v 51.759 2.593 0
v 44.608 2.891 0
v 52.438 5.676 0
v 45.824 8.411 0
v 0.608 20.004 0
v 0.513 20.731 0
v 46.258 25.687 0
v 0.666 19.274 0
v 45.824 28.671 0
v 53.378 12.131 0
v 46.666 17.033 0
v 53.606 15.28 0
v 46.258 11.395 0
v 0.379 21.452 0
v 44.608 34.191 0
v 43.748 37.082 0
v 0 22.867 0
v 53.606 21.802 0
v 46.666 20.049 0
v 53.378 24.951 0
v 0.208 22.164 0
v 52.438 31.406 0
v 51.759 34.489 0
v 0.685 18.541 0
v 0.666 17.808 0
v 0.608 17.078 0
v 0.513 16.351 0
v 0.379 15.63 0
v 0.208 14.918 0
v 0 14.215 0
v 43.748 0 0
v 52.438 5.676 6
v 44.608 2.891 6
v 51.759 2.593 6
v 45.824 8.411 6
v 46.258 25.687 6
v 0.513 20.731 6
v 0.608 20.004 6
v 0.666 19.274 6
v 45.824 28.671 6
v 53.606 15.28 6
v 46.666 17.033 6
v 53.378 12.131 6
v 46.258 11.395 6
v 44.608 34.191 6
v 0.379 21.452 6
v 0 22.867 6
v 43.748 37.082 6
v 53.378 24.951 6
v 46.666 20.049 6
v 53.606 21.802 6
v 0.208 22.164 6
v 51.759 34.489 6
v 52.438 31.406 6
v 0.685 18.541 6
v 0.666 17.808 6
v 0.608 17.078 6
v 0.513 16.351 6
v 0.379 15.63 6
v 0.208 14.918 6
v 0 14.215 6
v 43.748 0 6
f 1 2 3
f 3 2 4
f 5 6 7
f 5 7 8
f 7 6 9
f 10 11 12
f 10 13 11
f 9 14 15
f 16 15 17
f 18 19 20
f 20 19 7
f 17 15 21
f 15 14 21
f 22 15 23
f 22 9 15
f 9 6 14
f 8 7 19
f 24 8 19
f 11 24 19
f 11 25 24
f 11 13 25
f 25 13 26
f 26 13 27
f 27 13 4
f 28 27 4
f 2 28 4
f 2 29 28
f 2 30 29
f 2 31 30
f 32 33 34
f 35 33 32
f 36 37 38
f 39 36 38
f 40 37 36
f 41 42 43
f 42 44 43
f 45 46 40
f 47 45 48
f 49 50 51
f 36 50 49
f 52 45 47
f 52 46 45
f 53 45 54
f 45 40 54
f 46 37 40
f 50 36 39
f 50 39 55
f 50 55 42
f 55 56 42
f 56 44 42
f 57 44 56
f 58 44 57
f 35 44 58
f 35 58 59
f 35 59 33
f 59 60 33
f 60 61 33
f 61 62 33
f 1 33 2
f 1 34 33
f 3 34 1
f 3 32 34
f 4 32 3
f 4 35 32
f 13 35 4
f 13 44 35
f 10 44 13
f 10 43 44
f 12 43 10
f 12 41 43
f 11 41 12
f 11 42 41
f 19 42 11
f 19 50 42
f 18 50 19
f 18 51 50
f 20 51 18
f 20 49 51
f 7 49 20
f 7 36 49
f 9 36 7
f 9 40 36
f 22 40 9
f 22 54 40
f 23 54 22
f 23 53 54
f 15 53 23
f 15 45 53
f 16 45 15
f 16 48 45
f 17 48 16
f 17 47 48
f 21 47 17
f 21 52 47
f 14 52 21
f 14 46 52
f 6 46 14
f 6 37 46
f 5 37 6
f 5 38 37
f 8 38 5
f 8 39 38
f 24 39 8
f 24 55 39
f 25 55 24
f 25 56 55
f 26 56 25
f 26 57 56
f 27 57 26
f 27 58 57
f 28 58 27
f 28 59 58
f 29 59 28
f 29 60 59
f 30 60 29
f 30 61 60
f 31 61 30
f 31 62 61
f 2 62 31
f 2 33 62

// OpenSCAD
$fn = 32;

// ----------------------------------------------------------------------
// Gear sector: 4 teeth on 36 degrees
// ----------------------------------------------------------------------

// --- parameters (mm) ---
sector_angle = 36;        // sector angle, degrees
root_r = 60;              // root circle radius
tooth_h = 7;              // tooth height over the root circle
teeth = 4;                // number of teeth on the sector
hub_r = 14;               // hub bore radius
plate_t = 6;              // sector thickness, Z
arc_step = 3;             // sampling step of the root/hub arcs, degrees

tip_r = root_r + tooth_h;  // tip circle radius

profile = [[43.748, 0], [44.608, 2.891], [51.759, 2.593], [52.438, 5.676], [45.824, 8.411], [46.258, 11.395], [53.378, 12.131], [53.606, 15.28], [46.666, 17.033], [46.666, 20.049], [53.606, 21.802], [53.378, 24.951], [46.258, 25.687], [45.824, 28.671], [52.438, 31.406], [51.759, 34.489], [44.608, 34.191], [43.748, 37.082], [0, 22.867], [0.208, 22.164], [0.379, 21.452], [0.513, 20.731], [0.608, 20.004], [0.666, 19.274], [0.685, 18.541], [0.666, 17.808], [0.608, 17.078], [0.513, 16.351], [0.379, 15.63], [0.208, 14.918], [0, 14.215]];  // primary outline, 31 points, counter clockwise

// --- the one profile operation ---
linear_extrude(height = plate_t) polygon(points = profile);
